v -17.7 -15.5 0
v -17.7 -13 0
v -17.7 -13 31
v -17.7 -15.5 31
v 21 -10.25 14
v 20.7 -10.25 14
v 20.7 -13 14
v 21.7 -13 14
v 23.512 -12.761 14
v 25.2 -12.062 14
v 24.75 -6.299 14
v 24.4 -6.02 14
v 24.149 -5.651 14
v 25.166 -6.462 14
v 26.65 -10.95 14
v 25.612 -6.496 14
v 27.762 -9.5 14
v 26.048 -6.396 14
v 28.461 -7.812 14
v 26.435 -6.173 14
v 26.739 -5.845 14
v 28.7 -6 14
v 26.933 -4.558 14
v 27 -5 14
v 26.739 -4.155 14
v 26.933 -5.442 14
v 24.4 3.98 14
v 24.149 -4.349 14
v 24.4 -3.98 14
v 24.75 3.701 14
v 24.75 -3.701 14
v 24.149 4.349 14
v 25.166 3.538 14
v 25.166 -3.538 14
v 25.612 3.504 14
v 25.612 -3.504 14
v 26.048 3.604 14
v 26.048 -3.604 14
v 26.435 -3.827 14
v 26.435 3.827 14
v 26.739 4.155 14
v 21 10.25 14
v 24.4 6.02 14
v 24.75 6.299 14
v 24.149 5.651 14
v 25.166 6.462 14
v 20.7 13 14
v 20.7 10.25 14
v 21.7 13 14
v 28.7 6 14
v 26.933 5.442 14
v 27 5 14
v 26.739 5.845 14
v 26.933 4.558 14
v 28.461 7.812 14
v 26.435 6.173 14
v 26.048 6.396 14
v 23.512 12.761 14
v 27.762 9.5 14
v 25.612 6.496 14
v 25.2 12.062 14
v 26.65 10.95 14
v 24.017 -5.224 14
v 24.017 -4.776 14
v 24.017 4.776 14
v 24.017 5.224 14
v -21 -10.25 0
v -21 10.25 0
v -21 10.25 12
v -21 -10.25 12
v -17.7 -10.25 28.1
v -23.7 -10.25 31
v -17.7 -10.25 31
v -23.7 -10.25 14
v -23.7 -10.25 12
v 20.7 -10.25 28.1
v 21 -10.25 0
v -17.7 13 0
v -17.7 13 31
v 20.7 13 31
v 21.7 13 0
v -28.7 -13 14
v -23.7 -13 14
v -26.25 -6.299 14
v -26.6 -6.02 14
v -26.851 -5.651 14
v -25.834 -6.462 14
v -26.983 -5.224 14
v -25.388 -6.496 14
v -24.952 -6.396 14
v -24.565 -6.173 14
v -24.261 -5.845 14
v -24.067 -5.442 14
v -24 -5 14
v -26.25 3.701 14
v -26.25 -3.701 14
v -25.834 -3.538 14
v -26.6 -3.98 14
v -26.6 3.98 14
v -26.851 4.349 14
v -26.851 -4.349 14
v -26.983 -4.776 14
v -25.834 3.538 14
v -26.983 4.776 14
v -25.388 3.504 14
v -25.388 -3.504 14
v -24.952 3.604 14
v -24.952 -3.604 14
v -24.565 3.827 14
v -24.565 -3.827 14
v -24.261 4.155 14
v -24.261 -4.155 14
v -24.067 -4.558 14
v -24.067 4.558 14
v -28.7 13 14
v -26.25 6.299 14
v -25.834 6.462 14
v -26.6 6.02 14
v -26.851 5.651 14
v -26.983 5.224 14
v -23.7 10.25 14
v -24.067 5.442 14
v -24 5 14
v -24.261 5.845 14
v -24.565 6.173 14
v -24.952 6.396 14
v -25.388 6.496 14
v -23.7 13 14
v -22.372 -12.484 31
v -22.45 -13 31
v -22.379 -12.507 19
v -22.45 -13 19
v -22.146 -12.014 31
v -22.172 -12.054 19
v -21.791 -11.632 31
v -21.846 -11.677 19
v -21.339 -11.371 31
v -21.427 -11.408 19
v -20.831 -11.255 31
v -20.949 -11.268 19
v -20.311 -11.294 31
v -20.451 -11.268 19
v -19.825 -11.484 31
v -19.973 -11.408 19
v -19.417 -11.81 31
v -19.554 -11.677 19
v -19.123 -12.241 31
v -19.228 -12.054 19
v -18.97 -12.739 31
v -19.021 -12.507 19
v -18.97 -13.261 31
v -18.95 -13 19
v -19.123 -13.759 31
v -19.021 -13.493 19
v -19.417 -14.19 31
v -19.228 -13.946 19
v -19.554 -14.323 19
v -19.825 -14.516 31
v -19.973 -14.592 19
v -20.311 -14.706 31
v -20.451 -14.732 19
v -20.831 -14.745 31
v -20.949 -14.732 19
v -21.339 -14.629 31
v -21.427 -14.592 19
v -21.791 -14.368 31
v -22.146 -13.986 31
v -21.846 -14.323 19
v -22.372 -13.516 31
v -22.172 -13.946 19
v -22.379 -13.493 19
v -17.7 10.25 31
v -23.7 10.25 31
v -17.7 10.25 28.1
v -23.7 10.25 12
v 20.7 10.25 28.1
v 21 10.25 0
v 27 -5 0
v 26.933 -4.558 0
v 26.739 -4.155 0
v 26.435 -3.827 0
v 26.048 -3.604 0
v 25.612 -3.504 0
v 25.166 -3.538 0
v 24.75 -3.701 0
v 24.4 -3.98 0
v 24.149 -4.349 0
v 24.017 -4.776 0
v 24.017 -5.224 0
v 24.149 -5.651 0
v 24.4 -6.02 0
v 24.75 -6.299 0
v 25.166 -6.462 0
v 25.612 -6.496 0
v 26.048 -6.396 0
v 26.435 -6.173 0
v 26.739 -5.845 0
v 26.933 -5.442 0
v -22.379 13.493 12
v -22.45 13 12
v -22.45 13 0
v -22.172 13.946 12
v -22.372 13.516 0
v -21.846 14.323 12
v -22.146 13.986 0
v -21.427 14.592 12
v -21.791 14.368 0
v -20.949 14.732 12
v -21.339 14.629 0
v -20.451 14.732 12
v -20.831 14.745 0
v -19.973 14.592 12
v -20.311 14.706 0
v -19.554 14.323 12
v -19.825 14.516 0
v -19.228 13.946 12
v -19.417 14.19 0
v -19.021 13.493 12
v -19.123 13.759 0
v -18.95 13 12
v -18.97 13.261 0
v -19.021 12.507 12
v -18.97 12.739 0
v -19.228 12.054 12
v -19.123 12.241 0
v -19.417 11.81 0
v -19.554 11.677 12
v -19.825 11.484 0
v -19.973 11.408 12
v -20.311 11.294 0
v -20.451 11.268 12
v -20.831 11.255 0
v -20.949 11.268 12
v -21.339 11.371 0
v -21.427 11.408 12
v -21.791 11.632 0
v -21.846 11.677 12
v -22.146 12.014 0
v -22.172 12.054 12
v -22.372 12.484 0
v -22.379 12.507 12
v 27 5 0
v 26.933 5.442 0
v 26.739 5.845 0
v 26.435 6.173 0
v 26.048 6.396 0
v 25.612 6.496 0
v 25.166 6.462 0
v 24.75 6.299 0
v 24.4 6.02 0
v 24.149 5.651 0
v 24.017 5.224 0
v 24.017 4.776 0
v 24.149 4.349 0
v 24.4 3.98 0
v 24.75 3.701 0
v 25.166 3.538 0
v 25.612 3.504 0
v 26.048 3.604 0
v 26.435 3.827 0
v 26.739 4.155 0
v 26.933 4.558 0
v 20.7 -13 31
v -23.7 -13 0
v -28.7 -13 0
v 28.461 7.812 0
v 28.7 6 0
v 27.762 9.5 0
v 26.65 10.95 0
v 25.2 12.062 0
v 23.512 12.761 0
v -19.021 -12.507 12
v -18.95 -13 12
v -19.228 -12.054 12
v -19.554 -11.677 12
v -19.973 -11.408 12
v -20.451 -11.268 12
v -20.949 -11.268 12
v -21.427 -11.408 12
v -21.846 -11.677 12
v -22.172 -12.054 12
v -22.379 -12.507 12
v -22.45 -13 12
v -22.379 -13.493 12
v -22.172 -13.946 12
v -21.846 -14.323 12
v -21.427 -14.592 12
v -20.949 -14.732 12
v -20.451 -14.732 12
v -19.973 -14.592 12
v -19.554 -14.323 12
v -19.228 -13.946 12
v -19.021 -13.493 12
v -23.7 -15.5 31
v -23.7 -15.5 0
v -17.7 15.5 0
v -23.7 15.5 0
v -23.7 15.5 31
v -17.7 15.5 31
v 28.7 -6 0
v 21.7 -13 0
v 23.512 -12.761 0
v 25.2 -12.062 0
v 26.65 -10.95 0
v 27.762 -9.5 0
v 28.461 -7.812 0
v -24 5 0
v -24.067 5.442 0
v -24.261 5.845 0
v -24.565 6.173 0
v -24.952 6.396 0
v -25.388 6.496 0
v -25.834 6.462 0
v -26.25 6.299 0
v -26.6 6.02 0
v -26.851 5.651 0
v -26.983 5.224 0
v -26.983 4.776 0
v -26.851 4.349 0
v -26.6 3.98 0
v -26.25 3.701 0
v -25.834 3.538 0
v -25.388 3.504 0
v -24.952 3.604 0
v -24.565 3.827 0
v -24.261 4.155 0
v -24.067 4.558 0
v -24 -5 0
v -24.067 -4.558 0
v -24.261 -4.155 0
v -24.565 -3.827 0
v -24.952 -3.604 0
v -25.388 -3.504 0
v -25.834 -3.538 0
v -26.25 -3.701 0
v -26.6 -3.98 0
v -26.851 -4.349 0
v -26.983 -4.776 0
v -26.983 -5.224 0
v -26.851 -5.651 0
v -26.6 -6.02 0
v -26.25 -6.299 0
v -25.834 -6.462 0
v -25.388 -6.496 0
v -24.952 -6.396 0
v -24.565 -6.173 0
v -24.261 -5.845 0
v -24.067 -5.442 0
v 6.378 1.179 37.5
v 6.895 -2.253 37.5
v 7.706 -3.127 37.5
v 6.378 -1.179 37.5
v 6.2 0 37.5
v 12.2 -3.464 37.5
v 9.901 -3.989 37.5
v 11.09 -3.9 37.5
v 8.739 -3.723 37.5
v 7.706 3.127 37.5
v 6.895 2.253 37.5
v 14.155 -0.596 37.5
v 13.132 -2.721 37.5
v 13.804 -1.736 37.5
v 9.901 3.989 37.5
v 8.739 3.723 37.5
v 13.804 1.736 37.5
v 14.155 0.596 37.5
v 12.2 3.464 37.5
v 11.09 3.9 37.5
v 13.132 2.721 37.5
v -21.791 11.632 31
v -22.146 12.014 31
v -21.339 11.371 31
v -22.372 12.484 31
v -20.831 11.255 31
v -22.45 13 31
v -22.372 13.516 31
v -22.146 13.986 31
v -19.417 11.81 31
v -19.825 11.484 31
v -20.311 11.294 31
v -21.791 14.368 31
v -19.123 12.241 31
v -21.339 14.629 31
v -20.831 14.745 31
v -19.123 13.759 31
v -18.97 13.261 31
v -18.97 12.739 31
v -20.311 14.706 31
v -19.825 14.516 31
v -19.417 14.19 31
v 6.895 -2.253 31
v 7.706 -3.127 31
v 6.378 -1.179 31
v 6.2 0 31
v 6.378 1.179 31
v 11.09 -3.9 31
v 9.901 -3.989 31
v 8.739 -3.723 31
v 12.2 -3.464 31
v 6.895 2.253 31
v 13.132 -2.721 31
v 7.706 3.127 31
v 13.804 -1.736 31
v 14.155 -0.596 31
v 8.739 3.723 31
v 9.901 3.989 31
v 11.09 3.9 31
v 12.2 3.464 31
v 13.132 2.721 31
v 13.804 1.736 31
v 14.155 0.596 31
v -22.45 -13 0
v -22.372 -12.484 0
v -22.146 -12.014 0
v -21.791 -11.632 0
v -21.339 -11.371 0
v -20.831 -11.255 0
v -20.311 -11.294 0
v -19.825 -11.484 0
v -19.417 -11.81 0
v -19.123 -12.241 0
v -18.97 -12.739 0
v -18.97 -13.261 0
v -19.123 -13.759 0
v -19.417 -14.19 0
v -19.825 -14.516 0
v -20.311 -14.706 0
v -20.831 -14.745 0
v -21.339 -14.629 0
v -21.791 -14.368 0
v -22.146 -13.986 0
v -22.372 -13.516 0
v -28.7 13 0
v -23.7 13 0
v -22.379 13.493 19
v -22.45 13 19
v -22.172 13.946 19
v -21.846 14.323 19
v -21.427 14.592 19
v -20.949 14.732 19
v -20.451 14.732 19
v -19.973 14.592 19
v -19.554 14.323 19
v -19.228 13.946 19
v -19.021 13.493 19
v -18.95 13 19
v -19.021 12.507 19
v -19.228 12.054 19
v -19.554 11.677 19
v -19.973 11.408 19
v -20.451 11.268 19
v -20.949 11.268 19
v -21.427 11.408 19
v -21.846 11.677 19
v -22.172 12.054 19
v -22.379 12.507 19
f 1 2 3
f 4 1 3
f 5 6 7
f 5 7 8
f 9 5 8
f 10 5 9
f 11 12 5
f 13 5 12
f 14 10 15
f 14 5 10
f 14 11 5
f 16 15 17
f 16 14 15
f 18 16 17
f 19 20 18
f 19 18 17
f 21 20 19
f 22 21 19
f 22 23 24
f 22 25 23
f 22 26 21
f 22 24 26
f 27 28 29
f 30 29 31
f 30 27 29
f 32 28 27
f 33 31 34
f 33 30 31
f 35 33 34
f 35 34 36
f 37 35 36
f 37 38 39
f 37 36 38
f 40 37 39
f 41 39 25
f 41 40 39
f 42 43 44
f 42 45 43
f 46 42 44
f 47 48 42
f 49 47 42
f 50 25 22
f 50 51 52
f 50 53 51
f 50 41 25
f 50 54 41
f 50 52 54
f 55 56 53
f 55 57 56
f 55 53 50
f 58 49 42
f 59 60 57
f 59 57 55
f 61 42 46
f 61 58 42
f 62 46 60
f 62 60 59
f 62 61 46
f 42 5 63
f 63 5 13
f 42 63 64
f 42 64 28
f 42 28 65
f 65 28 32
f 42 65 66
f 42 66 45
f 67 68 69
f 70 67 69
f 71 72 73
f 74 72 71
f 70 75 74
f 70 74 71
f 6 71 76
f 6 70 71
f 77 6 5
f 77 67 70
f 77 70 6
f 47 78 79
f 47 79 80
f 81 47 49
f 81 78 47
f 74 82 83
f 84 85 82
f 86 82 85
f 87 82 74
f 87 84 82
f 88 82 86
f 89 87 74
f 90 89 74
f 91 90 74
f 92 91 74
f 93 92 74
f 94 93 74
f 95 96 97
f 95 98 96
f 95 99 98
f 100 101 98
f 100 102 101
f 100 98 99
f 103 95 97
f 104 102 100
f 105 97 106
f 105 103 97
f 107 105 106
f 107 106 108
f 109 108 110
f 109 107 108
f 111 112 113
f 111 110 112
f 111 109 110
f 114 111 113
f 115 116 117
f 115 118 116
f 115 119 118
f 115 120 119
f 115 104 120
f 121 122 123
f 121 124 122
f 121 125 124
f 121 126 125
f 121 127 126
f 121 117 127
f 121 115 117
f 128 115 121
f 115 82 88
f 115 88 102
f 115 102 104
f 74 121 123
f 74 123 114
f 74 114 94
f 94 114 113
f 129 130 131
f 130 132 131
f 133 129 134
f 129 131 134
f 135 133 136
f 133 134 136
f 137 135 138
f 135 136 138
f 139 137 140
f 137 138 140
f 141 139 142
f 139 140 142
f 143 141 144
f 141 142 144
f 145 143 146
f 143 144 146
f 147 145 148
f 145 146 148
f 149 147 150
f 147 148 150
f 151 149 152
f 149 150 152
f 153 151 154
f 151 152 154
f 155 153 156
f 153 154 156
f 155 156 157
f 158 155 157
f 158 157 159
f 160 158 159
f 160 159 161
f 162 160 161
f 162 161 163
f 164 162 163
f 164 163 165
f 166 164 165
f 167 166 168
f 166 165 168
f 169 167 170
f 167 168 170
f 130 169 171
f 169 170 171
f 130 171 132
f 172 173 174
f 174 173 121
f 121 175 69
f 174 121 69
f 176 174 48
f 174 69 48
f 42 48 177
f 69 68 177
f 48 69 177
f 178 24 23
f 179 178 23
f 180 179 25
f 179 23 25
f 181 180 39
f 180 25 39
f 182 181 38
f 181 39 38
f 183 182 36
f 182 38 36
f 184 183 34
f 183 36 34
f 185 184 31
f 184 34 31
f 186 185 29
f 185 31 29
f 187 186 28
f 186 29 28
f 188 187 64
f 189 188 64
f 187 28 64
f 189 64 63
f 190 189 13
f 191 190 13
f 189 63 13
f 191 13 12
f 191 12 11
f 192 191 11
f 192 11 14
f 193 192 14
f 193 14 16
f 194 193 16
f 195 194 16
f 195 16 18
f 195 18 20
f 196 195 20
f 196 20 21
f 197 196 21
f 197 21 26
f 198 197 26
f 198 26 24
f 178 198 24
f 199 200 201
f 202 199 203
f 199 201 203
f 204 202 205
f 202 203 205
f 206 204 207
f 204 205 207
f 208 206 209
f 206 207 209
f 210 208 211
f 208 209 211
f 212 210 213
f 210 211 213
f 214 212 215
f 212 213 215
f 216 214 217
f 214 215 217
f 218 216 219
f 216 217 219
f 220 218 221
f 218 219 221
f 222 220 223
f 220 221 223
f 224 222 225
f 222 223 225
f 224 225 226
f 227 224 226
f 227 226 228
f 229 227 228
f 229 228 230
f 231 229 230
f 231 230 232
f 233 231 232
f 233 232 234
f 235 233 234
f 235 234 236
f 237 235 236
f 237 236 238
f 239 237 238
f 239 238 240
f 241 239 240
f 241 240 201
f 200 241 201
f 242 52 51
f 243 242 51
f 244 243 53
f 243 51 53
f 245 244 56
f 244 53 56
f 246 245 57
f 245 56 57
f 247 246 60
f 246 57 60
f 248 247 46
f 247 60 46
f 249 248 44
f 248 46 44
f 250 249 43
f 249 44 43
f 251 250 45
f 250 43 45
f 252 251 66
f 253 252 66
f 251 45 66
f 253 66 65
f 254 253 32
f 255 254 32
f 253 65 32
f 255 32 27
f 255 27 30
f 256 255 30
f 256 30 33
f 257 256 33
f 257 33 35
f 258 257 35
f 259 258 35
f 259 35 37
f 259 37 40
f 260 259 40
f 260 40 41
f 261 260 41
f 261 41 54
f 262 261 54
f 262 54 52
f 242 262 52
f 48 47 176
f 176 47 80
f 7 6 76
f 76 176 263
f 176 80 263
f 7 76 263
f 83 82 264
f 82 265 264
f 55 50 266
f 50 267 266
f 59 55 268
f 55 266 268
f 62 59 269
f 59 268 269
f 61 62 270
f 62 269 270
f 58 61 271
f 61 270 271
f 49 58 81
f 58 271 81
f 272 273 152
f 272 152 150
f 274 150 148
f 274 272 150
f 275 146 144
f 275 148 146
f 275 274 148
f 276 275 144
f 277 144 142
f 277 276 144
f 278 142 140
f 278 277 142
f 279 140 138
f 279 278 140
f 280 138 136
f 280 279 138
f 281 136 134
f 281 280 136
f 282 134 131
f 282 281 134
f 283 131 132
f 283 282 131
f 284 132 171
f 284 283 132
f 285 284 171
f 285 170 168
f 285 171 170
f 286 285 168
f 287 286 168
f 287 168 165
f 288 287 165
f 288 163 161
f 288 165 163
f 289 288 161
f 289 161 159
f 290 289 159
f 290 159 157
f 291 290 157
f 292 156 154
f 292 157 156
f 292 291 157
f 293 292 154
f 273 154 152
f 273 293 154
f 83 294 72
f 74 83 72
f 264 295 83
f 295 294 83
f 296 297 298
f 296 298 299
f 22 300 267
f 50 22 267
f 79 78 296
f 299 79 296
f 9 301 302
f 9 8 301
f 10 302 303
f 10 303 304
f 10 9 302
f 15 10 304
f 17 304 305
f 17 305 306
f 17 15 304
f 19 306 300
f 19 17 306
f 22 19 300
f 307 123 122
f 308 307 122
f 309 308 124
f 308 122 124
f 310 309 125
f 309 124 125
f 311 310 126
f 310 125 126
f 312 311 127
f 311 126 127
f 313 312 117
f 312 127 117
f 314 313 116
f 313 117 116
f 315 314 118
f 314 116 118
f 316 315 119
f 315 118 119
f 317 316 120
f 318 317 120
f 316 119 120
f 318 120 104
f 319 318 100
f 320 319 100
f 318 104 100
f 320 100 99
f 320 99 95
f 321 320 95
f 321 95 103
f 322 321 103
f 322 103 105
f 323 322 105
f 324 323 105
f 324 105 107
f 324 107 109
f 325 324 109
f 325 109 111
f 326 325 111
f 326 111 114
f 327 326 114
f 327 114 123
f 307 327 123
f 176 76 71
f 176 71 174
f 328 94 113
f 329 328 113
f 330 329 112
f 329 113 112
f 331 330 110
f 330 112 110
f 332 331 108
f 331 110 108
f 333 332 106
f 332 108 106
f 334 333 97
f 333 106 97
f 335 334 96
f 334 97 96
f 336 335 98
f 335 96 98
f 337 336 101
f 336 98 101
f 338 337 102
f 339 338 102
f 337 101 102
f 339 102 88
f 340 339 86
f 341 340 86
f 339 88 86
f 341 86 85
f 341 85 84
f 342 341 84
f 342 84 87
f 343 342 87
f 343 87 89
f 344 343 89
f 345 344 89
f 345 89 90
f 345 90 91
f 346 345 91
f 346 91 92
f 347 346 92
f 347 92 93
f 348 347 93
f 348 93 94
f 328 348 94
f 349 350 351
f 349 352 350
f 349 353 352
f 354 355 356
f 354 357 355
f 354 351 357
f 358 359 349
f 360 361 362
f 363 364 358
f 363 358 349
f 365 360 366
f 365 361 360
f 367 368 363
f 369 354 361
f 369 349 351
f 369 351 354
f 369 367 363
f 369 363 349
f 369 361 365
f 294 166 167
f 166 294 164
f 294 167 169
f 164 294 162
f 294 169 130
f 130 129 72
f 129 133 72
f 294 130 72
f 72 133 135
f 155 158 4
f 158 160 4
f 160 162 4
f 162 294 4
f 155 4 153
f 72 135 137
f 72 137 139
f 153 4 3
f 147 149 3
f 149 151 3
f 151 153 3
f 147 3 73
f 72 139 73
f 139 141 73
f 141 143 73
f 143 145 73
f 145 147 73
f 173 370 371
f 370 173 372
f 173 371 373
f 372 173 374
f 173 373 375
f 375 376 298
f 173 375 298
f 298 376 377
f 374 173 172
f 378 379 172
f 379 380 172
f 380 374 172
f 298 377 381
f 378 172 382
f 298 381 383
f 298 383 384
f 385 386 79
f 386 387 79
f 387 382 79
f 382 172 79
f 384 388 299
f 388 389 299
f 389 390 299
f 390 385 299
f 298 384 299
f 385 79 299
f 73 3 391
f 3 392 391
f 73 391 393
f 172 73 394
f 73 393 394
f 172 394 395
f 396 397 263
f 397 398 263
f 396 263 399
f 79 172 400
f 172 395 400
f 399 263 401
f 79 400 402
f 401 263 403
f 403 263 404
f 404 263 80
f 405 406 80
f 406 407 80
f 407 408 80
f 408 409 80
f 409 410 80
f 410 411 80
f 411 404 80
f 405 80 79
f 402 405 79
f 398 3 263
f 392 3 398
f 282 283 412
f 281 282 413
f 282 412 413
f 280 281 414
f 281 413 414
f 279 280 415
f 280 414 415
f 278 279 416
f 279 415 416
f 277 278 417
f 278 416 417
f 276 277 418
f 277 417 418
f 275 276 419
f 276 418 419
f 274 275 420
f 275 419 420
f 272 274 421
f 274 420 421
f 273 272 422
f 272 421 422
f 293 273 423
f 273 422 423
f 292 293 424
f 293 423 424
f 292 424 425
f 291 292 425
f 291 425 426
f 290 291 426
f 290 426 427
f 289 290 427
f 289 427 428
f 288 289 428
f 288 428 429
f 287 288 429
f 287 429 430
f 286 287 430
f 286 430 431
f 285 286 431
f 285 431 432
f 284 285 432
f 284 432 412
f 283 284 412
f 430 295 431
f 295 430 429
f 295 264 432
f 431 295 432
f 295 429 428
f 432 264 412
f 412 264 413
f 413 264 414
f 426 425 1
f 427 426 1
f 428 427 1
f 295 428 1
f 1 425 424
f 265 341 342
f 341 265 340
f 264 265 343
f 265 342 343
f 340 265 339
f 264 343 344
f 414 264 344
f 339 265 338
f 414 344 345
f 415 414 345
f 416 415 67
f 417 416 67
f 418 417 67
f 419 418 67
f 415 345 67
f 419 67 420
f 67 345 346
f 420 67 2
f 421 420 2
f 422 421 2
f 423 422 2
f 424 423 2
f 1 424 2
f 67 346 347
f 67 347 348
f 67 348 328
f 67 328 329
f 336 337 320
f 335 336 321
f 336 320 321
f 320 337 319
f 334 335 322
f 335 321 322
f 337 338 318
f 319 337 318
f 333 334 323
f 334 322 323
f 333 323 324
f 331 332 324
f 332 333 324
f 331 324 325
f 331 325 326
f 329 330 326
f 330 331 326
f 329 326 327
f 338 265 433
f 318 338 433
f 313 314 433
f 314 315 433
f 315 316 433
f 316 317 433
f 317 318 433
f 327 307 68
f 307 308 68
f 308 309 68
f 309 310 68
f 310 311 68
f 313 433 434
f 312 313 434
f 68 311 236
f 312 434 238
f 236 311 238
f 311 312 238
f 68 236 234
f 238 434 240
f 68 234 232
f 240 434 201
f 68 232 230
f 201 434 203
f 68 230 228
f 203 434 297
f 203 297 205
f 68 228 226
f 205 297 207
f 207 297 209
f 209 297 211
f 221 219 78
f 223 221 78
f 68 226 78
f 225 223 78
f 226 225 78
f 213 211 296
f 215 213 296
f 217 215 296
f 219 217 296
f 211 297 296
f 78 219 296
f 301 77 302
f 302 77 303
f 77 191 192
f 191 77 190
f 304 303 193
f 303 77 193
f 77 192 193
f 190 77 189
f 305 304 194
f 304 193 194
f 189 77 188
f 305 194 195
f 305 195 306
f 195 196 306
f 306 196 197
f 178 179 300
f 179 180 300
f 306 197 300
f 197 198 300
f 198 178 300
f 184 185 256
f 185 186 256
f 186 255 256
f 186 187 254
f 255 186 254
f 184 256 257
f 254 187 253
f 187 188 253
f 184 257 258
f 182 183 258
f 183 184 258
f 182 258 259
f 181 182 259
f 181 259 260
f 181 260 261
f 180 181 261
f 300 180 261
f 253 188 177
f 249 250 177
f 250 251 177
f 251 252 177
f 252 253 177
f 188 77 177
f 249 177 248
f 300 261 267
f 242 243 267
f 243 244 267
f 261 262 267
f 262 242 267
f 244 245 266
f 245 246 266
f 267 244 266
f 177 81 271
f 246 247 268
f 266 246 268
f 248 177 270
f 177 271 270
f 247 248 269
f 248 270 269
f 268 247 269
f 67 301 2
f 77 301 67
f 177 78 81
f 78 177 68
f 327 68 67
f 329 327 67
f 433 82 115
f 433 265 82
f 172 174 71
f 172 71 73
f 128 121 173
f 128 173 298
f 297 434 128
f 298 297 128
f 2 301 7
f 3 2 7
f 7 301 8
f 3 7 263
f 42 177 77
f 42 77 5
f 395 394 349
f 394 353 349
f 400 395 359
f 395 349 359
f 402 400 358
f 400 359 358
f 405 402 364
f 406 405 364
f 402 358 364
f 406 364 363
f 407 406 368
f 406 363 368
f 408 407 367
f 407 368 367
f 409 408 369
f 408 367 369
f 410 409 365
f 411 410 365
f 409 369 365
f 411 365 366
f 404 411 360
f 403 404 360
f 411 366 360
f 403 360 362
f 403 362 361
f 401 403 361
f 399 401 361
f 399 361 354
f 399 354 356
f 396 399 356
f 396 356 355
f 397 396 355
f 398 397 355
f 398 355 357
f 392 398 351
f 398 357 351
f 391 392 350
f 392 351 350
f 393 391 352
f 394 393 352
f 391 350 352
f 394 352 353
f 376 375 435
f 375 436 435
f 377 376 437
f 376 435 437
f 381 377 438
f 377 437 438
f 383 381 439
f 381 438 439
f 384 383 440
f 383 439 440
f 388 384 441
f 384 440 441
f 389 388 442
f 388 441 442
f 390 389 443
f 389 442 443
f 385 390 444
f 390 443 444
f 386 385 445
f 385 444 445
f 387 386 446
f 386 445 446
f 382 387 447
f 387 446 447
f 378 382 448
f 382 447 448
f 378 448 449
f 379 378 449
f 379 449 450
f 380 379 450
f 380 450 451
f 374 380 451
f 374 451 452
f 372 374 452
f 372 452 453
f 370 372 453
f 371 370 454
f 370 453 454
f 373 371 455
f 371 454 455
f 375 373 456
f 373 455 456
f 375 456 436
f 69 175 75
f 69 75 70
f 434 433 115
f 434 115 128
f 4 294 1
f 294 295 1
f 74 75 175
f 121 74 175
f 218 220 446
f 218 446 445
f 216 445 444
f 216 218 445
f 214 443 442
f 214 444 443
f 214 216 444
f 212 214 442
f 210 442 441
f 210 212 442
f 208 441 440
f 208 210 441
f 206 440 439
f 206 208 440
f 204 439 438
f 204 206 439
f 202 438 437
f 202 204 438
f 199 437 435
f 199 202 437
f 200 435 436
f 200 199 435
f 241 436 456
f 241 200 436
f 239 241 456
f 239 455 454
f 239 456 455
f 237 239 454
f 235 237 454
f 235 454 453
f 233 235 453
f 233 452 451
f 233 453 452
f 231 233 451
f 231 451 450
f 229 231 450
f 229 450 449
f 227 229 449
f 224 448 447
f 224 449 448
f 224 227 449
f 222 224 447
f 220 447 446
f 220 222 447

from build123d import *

# Parameters (mm, degrees)
SKETCH_1_W                  = 57.4
SKETCH_1_H                  = 28.5
EXTRUDE_1_DEPTH             = 12
SKETCH_2_W                  = 57.4
SKETCH_2_H                  = 26
EXTRUDE_2_DEPTH             = 19
SKETCH_3_W                  = 16.1
SKETCH_3_H                  = 20.5
CUT_EXTRUDE_1_DEPTH         = 7.7
SKETCH_4_W                  = 28.1
SKETCH_4_H                  = 20.5
CUT_EXTRUDE_2_DEPTH         = 41.7
SKETCH_5_W                  = 31
SKETCH_5_H                  = 20.5
CUT_EXTRUDE_3_DEPTH         = 0.3
CUT_EXTRUDE_4_DEPTH         = 2.9
SKETCH_7_W                  = 12
SKETCH_7_H                  = 2.5
CUT_EXTRUDE_5_DEPTH         = 46.4
CUT_EXTRUDE_6_DEPTH         = 7.7
CUT_EXTRUDE_7_DEPTH         = 14.1
CUT_EXTRUDE_8_DEPTH         = 3.3
SKETCH_11_W                 = 11
SKETCH_11_H                 = 12
EXTRUDE_3_DEPTH             = 2.5
SKETCH_12_W                 = 12
SKETCH_12_H                 = 2.75
EXTRUDE_4_DEPTH             = 6
SKETCH_13_W                 = 6
SKETCH_13_H                 = 12
EXTRUDE_5_DEPTH             = 2.5
SKETCH_14_W                 = 12
SKETCH_14_H                 = 5.25
EXTRUDE_6_DEPTH             = 6
SKETCH_15_W                 = 5
SKETCH_15_H                 = 2.5
CUT_EXTRUDE_9_DEPTH         = 45.999333328
SKETCH_16_W                 = 5
SKETCH_16_H                 = 2.5
CUT_EXTRUDE_10_DEPTH        = 45.999333328
SKETCH_17_W                 = 5
SKETCH_17_H                 = 26
EXTRUDE_7_DEPTH             = 2
SKETCH_19_W                 = 4
SKETCH_19_H                 = 6.5
HOLE_WIZARD_3_5_3_5_1_D     = 3.5
HOLE_WIZARD_3_5_3_5_1_DEPTH = 12
HOLE_WIZARD_3_0_3_3_D       = 3
HOLE_WIZARD_3_0_3_3_DEPTH   = 37.5
HOLE_WIZARD_3_5_3_5_3_D     = 3.5
FILLET_1_R                  = 7
EXTRUDE_START               = -19
SKETCH_28_W                 = 6
SKETCH_28_H                 = 5.25
SKETCH_28_R                 = 1.75
EXTRUDE_8_DEPTH             = 7


with BuildPart() as part:
    # Эскиз1 → Бобышка-Вытянуть1 (new body)
    with BuildSketch(Plane.XY.offset(12)):
        with Locations((0, 1.25)):
            Rectangle(SKETCH_1_W, SKETCH_1_H)
    extrude(amount=-EXTRUDE_1_DEPTH)

    # Эскиз2 → Бобышка-Вытянуть2 (add)
    with BuildSketch(Plane.XY.offset(12)):
        Rectangle(SKETCH_2_W, SKETCH_2_H)
    extrude(amount=EXTRUDE_2_DEPTH)

    # Эскиз3 → Вырез-Вытянуть1 (cut)
    with BuildSketch(Plane.ZY.offset(28.7)):
        with Locations((20.05, 0)):
            Rectangle(SKETCH_3_W, SKETCH_3_H)
    extrude(amount=-CUT_EXTRUDE_1_DEPTH, mode=Mode.SUBTRACT)

    # Эскиз4 → Вырез-Вытянуть2 (cut)
    with BuildSketch(Plane.ZY.offset(21)):
        with Locations((14.05, 0)):
            Rectangle(SKETCH_4_W, SKETCH_4_H)
    extrude(amount=-CUT_EXTRUDE_2_DEPTH, mode=Mode.SUBTRACT)

    # Эскиз5 → Вырез-Вытянуть3 (cut)
    with BuildSketch(Plane.ZY.offset(-20.7)):
        with Locations((15.5, 0)):
            Rectangle(SKETCH_5_W, SKETCH_5_H)
    extrude(amount=-CUT_EXTRUDE_3_DEPTH, mode=Mode.SUBTRACT)

    # Эскиз6 → Вырез-Вытянуть4 (cut)
    with BuildSketch(Plane.XY.offset(31)):
        Polygon((28.7, -13), (28.7, 13), (20.7, 13), (20.7, 10.25), (21, 10.25), (21, -10.25), (20.7, -10.25), (20.7, -13), align=None)
    extrude(amount=-CUT_EXTRUDE_4_DEPTH, mode=Mode.SUBTRACT)

    # Эскиз7 → Вырез-Вытянуть5 (cut)
    with BuildSketch(Plane(origin=(28.7, 0, 0), x_dir=(0, 0, -1), z_dir=(1, 0, 0))):
        with Locations((-6, 14.25)):
            Rectangle(SKETCH_7_W, SKETCH_7_H)
    extrude(amount=-CUT_EXTRUDE_5_DEPTH, mode=Mode.SUBTRACT)

    # Эскиз8 → Вырез-Вытянуть6 (cut)
    with BuildSketch(Plane.ZY.offset(28.7)):
        Polygon((12, -13), (31, -13), (31, 13), (12, 13), (12, 10.25), (28.1, 10.25), (28.1, -10.25), (12, -10.25), align=None)
    extrude(amount=-CUT_EXTRUDE_6_DEPTH, mode=Mode.SUBTRACT)

    # Эскиз9 → Вырез-Вытянуть7 (cut)
    with BuildSketch(Plane.XY.offset(28.1)):
        Polygon((28.7, -13), (28.7, 13), (20.7, 13), (20.7, 10.25), (21, 10.25), (21, -10.25), (20.7, -10.25), (20.7, -13), align=None)
    extrude(amount=-CUT_EXTRUDE_7_DEPTH, mode=Mode.SUBTRACT)

    # Эскиз10 → Вырез-Вытянуть8 (cut)
    with BuildSketch(Plane.ZY.offset(21)):
        Polygon((12, -13), (31, -13), (31, 13), (12, 13), (12, 10.25), (28.1, 10.25), (28.1, -10.25), (12, -10.25), align=None)
    extrude(amount=-CUT_EXTRUDE_8_DEPTH, mode=Mode.SUBTRACT)

    # Эскиз11 → Бобышка-Вытянуть3 (add)
    with BuildSketch(Plane.XZ.offset(13)):
        with Locations((-23.2, 6)):
            Rectangle(SKETCH_11_W, SKETCH_11_H)
    extrude(amount=EXTRUDE_3_DEPTH)

    # Эскиз12 → Бобышка-Вытянуть4 (add)
    with BuildSketch(Plane.ZY.offset(17.7)):
        with Locations((25, -11.625)):
            Rectangle(SKETCH_12_W, SKETCH_12_H)
    extrude(amount=EXTRUDE_4_DEPTH)

    # Эскиз13 → Бобышка-Вытянуть5 (add)
    with BuildSketch(Plane.XZ.offset(13)):
        with Locations((-20.7, 25)):
            Rectangle(SKETCH_13_W, SKETCH_13_H)
    extrude(amount=EXTRUDE_5_DEPTH)

    # Эскиз14 → Бобышка-Вытянуть6 (add)
    with BuildSketch(Plane.ZY.offset(17.7)):
        with Locations((25, 12.875)):
            Rectangle(SKETCH_14_W, SKETCH_14_H)
    extrude(amount=EXTRUDE_6_DEPTH)

    # Эскиз15 → Вырез-Вытянуть9 (cut, through all)
    with BuildSketch(Plane(origin=(0, 0, 0), x_dir=(-1, 0, 0), z_dir=(0, 0, -1))):
        with Locations((26.2, -14.25)):
            Rectangle(SKETCH_15_W, SKETCH_15_H)
    extrude(amount=-CUT_EXTRUDE_9_DEPTH, mode=Mode.SUBTRACT)

    # Эскиз16 → Вырез-Вытянуть10 (cut, through all)
    with BuildSketch(Plane(origin=(0, 0, 0), x_dir=(-1, 0, 0), z_dir=(0, 0, -1))):
        with Locations((26.2, 14.25)):
            Rectangle(SKETCH_16_W, SKETCH_16_H)
    extrude(amount=-CUT_EXTRUDE_10_DEPTH, mode=Mode.SUBTRACT)

    # Эскиз17 → Бобышка-Вытянуть7 (add)
    with BuildSketch(Plane.XY.offset(12)):
        with Locations((-26.2, 0)):
            Rectangle(SKETCH_17_W, SKETCH_17_H)
    extrude(amount=EXTRUDE_7_DEPTH)

    # Эскиз19 → Повернуть1 (revolve)
    with BuildSketch(Plane.XZ, mode=Mode.PRIVATE) as revolve_1_sk:
        with Locations((12.2, 34.25)):
            Rectangle(SKETCH_19_W, SKETCH_19_H)
    revolve(revolve_1_sk.sketch.rotate(Axis((10.2, 0, 37.5), (0, 0, -1)), 180), axis=Axis((10.2, 0, 37.5), (0, 0, -1)))

    # Диаметр отверстия Ø3.5 (3.5)1
    with Locations(Plane.XY.offset(31)):
        with Locations((-20.7, 13), (-20.7, -13)):
            Hole(HOLE_WIZARD_3_5_3_5_1_D / 2, depth=HOLE_WIZARD_3_5_3_5_1_DEPTH)

    # Диаметр отверстия Ø3.0 (3)3
    with Locations(Plane(origin=(0, 0, 0), x_dir=(-1, 0, 0), z_dir=(0, 0, -1))):
        with Locations((-25.5, -5), (-25.5, 5), (25.5, -5), (25.5, 5)):
            Hole(HOLE_WIZARD_3_0_3_3_D / 2, depth=HOLE_WIZARD_3_0_3_3_DEPTH)

    # Диаметр отверстия Ø3.5 (3.5)3 (through all)
    with Locations(Plane.XY.offset(12)):
        with Locations((-20.7, 13), (-20.7, -13)):
            Hole(HOLE_WIZARD_3_5_3_5_3_D / 2)

    # Скругление1
    fillet_1_edges = [part.edges().sort_by_distance(p)[0] for p in [
        (28.7, 13, 7),
        (28.7, -13, 7),
    ]]
    fillet(fillet_1_edges, radius=FILLET_1_R)

    # Эскиз28 → Бобышка-Вытянуть8 (add)
    # profile 1 of 2: a face of its own
    with BuildSketch(Plane.XY.offset(31).offset(EXTRUDE_START)):
        with Locations((-20.7, 12.875)):
            Rectangle(SKETCH_28_W, SKETCH_28_H)
        with Locations((-20.7, 13)):
            Circle(SKETCH_28_R, mode=Mode.SUBTRACT)
    # profile 2 of 2: a face of its own
    with BuildSketch(Plane.XY.offset(31).offset(EXTRUDE_START)):
        with Locations((-20.7, -12.875)):
            Rectangle(SKETCH_28_W, SKETCH_28_H)
        with Locations((-20.7, -13)):
            Circle(SKETCH_28_R, mode=Mode.SUBTRACT)
    extrude(amount=EXTRUDE_8_DEPTH)


solid = part.part
